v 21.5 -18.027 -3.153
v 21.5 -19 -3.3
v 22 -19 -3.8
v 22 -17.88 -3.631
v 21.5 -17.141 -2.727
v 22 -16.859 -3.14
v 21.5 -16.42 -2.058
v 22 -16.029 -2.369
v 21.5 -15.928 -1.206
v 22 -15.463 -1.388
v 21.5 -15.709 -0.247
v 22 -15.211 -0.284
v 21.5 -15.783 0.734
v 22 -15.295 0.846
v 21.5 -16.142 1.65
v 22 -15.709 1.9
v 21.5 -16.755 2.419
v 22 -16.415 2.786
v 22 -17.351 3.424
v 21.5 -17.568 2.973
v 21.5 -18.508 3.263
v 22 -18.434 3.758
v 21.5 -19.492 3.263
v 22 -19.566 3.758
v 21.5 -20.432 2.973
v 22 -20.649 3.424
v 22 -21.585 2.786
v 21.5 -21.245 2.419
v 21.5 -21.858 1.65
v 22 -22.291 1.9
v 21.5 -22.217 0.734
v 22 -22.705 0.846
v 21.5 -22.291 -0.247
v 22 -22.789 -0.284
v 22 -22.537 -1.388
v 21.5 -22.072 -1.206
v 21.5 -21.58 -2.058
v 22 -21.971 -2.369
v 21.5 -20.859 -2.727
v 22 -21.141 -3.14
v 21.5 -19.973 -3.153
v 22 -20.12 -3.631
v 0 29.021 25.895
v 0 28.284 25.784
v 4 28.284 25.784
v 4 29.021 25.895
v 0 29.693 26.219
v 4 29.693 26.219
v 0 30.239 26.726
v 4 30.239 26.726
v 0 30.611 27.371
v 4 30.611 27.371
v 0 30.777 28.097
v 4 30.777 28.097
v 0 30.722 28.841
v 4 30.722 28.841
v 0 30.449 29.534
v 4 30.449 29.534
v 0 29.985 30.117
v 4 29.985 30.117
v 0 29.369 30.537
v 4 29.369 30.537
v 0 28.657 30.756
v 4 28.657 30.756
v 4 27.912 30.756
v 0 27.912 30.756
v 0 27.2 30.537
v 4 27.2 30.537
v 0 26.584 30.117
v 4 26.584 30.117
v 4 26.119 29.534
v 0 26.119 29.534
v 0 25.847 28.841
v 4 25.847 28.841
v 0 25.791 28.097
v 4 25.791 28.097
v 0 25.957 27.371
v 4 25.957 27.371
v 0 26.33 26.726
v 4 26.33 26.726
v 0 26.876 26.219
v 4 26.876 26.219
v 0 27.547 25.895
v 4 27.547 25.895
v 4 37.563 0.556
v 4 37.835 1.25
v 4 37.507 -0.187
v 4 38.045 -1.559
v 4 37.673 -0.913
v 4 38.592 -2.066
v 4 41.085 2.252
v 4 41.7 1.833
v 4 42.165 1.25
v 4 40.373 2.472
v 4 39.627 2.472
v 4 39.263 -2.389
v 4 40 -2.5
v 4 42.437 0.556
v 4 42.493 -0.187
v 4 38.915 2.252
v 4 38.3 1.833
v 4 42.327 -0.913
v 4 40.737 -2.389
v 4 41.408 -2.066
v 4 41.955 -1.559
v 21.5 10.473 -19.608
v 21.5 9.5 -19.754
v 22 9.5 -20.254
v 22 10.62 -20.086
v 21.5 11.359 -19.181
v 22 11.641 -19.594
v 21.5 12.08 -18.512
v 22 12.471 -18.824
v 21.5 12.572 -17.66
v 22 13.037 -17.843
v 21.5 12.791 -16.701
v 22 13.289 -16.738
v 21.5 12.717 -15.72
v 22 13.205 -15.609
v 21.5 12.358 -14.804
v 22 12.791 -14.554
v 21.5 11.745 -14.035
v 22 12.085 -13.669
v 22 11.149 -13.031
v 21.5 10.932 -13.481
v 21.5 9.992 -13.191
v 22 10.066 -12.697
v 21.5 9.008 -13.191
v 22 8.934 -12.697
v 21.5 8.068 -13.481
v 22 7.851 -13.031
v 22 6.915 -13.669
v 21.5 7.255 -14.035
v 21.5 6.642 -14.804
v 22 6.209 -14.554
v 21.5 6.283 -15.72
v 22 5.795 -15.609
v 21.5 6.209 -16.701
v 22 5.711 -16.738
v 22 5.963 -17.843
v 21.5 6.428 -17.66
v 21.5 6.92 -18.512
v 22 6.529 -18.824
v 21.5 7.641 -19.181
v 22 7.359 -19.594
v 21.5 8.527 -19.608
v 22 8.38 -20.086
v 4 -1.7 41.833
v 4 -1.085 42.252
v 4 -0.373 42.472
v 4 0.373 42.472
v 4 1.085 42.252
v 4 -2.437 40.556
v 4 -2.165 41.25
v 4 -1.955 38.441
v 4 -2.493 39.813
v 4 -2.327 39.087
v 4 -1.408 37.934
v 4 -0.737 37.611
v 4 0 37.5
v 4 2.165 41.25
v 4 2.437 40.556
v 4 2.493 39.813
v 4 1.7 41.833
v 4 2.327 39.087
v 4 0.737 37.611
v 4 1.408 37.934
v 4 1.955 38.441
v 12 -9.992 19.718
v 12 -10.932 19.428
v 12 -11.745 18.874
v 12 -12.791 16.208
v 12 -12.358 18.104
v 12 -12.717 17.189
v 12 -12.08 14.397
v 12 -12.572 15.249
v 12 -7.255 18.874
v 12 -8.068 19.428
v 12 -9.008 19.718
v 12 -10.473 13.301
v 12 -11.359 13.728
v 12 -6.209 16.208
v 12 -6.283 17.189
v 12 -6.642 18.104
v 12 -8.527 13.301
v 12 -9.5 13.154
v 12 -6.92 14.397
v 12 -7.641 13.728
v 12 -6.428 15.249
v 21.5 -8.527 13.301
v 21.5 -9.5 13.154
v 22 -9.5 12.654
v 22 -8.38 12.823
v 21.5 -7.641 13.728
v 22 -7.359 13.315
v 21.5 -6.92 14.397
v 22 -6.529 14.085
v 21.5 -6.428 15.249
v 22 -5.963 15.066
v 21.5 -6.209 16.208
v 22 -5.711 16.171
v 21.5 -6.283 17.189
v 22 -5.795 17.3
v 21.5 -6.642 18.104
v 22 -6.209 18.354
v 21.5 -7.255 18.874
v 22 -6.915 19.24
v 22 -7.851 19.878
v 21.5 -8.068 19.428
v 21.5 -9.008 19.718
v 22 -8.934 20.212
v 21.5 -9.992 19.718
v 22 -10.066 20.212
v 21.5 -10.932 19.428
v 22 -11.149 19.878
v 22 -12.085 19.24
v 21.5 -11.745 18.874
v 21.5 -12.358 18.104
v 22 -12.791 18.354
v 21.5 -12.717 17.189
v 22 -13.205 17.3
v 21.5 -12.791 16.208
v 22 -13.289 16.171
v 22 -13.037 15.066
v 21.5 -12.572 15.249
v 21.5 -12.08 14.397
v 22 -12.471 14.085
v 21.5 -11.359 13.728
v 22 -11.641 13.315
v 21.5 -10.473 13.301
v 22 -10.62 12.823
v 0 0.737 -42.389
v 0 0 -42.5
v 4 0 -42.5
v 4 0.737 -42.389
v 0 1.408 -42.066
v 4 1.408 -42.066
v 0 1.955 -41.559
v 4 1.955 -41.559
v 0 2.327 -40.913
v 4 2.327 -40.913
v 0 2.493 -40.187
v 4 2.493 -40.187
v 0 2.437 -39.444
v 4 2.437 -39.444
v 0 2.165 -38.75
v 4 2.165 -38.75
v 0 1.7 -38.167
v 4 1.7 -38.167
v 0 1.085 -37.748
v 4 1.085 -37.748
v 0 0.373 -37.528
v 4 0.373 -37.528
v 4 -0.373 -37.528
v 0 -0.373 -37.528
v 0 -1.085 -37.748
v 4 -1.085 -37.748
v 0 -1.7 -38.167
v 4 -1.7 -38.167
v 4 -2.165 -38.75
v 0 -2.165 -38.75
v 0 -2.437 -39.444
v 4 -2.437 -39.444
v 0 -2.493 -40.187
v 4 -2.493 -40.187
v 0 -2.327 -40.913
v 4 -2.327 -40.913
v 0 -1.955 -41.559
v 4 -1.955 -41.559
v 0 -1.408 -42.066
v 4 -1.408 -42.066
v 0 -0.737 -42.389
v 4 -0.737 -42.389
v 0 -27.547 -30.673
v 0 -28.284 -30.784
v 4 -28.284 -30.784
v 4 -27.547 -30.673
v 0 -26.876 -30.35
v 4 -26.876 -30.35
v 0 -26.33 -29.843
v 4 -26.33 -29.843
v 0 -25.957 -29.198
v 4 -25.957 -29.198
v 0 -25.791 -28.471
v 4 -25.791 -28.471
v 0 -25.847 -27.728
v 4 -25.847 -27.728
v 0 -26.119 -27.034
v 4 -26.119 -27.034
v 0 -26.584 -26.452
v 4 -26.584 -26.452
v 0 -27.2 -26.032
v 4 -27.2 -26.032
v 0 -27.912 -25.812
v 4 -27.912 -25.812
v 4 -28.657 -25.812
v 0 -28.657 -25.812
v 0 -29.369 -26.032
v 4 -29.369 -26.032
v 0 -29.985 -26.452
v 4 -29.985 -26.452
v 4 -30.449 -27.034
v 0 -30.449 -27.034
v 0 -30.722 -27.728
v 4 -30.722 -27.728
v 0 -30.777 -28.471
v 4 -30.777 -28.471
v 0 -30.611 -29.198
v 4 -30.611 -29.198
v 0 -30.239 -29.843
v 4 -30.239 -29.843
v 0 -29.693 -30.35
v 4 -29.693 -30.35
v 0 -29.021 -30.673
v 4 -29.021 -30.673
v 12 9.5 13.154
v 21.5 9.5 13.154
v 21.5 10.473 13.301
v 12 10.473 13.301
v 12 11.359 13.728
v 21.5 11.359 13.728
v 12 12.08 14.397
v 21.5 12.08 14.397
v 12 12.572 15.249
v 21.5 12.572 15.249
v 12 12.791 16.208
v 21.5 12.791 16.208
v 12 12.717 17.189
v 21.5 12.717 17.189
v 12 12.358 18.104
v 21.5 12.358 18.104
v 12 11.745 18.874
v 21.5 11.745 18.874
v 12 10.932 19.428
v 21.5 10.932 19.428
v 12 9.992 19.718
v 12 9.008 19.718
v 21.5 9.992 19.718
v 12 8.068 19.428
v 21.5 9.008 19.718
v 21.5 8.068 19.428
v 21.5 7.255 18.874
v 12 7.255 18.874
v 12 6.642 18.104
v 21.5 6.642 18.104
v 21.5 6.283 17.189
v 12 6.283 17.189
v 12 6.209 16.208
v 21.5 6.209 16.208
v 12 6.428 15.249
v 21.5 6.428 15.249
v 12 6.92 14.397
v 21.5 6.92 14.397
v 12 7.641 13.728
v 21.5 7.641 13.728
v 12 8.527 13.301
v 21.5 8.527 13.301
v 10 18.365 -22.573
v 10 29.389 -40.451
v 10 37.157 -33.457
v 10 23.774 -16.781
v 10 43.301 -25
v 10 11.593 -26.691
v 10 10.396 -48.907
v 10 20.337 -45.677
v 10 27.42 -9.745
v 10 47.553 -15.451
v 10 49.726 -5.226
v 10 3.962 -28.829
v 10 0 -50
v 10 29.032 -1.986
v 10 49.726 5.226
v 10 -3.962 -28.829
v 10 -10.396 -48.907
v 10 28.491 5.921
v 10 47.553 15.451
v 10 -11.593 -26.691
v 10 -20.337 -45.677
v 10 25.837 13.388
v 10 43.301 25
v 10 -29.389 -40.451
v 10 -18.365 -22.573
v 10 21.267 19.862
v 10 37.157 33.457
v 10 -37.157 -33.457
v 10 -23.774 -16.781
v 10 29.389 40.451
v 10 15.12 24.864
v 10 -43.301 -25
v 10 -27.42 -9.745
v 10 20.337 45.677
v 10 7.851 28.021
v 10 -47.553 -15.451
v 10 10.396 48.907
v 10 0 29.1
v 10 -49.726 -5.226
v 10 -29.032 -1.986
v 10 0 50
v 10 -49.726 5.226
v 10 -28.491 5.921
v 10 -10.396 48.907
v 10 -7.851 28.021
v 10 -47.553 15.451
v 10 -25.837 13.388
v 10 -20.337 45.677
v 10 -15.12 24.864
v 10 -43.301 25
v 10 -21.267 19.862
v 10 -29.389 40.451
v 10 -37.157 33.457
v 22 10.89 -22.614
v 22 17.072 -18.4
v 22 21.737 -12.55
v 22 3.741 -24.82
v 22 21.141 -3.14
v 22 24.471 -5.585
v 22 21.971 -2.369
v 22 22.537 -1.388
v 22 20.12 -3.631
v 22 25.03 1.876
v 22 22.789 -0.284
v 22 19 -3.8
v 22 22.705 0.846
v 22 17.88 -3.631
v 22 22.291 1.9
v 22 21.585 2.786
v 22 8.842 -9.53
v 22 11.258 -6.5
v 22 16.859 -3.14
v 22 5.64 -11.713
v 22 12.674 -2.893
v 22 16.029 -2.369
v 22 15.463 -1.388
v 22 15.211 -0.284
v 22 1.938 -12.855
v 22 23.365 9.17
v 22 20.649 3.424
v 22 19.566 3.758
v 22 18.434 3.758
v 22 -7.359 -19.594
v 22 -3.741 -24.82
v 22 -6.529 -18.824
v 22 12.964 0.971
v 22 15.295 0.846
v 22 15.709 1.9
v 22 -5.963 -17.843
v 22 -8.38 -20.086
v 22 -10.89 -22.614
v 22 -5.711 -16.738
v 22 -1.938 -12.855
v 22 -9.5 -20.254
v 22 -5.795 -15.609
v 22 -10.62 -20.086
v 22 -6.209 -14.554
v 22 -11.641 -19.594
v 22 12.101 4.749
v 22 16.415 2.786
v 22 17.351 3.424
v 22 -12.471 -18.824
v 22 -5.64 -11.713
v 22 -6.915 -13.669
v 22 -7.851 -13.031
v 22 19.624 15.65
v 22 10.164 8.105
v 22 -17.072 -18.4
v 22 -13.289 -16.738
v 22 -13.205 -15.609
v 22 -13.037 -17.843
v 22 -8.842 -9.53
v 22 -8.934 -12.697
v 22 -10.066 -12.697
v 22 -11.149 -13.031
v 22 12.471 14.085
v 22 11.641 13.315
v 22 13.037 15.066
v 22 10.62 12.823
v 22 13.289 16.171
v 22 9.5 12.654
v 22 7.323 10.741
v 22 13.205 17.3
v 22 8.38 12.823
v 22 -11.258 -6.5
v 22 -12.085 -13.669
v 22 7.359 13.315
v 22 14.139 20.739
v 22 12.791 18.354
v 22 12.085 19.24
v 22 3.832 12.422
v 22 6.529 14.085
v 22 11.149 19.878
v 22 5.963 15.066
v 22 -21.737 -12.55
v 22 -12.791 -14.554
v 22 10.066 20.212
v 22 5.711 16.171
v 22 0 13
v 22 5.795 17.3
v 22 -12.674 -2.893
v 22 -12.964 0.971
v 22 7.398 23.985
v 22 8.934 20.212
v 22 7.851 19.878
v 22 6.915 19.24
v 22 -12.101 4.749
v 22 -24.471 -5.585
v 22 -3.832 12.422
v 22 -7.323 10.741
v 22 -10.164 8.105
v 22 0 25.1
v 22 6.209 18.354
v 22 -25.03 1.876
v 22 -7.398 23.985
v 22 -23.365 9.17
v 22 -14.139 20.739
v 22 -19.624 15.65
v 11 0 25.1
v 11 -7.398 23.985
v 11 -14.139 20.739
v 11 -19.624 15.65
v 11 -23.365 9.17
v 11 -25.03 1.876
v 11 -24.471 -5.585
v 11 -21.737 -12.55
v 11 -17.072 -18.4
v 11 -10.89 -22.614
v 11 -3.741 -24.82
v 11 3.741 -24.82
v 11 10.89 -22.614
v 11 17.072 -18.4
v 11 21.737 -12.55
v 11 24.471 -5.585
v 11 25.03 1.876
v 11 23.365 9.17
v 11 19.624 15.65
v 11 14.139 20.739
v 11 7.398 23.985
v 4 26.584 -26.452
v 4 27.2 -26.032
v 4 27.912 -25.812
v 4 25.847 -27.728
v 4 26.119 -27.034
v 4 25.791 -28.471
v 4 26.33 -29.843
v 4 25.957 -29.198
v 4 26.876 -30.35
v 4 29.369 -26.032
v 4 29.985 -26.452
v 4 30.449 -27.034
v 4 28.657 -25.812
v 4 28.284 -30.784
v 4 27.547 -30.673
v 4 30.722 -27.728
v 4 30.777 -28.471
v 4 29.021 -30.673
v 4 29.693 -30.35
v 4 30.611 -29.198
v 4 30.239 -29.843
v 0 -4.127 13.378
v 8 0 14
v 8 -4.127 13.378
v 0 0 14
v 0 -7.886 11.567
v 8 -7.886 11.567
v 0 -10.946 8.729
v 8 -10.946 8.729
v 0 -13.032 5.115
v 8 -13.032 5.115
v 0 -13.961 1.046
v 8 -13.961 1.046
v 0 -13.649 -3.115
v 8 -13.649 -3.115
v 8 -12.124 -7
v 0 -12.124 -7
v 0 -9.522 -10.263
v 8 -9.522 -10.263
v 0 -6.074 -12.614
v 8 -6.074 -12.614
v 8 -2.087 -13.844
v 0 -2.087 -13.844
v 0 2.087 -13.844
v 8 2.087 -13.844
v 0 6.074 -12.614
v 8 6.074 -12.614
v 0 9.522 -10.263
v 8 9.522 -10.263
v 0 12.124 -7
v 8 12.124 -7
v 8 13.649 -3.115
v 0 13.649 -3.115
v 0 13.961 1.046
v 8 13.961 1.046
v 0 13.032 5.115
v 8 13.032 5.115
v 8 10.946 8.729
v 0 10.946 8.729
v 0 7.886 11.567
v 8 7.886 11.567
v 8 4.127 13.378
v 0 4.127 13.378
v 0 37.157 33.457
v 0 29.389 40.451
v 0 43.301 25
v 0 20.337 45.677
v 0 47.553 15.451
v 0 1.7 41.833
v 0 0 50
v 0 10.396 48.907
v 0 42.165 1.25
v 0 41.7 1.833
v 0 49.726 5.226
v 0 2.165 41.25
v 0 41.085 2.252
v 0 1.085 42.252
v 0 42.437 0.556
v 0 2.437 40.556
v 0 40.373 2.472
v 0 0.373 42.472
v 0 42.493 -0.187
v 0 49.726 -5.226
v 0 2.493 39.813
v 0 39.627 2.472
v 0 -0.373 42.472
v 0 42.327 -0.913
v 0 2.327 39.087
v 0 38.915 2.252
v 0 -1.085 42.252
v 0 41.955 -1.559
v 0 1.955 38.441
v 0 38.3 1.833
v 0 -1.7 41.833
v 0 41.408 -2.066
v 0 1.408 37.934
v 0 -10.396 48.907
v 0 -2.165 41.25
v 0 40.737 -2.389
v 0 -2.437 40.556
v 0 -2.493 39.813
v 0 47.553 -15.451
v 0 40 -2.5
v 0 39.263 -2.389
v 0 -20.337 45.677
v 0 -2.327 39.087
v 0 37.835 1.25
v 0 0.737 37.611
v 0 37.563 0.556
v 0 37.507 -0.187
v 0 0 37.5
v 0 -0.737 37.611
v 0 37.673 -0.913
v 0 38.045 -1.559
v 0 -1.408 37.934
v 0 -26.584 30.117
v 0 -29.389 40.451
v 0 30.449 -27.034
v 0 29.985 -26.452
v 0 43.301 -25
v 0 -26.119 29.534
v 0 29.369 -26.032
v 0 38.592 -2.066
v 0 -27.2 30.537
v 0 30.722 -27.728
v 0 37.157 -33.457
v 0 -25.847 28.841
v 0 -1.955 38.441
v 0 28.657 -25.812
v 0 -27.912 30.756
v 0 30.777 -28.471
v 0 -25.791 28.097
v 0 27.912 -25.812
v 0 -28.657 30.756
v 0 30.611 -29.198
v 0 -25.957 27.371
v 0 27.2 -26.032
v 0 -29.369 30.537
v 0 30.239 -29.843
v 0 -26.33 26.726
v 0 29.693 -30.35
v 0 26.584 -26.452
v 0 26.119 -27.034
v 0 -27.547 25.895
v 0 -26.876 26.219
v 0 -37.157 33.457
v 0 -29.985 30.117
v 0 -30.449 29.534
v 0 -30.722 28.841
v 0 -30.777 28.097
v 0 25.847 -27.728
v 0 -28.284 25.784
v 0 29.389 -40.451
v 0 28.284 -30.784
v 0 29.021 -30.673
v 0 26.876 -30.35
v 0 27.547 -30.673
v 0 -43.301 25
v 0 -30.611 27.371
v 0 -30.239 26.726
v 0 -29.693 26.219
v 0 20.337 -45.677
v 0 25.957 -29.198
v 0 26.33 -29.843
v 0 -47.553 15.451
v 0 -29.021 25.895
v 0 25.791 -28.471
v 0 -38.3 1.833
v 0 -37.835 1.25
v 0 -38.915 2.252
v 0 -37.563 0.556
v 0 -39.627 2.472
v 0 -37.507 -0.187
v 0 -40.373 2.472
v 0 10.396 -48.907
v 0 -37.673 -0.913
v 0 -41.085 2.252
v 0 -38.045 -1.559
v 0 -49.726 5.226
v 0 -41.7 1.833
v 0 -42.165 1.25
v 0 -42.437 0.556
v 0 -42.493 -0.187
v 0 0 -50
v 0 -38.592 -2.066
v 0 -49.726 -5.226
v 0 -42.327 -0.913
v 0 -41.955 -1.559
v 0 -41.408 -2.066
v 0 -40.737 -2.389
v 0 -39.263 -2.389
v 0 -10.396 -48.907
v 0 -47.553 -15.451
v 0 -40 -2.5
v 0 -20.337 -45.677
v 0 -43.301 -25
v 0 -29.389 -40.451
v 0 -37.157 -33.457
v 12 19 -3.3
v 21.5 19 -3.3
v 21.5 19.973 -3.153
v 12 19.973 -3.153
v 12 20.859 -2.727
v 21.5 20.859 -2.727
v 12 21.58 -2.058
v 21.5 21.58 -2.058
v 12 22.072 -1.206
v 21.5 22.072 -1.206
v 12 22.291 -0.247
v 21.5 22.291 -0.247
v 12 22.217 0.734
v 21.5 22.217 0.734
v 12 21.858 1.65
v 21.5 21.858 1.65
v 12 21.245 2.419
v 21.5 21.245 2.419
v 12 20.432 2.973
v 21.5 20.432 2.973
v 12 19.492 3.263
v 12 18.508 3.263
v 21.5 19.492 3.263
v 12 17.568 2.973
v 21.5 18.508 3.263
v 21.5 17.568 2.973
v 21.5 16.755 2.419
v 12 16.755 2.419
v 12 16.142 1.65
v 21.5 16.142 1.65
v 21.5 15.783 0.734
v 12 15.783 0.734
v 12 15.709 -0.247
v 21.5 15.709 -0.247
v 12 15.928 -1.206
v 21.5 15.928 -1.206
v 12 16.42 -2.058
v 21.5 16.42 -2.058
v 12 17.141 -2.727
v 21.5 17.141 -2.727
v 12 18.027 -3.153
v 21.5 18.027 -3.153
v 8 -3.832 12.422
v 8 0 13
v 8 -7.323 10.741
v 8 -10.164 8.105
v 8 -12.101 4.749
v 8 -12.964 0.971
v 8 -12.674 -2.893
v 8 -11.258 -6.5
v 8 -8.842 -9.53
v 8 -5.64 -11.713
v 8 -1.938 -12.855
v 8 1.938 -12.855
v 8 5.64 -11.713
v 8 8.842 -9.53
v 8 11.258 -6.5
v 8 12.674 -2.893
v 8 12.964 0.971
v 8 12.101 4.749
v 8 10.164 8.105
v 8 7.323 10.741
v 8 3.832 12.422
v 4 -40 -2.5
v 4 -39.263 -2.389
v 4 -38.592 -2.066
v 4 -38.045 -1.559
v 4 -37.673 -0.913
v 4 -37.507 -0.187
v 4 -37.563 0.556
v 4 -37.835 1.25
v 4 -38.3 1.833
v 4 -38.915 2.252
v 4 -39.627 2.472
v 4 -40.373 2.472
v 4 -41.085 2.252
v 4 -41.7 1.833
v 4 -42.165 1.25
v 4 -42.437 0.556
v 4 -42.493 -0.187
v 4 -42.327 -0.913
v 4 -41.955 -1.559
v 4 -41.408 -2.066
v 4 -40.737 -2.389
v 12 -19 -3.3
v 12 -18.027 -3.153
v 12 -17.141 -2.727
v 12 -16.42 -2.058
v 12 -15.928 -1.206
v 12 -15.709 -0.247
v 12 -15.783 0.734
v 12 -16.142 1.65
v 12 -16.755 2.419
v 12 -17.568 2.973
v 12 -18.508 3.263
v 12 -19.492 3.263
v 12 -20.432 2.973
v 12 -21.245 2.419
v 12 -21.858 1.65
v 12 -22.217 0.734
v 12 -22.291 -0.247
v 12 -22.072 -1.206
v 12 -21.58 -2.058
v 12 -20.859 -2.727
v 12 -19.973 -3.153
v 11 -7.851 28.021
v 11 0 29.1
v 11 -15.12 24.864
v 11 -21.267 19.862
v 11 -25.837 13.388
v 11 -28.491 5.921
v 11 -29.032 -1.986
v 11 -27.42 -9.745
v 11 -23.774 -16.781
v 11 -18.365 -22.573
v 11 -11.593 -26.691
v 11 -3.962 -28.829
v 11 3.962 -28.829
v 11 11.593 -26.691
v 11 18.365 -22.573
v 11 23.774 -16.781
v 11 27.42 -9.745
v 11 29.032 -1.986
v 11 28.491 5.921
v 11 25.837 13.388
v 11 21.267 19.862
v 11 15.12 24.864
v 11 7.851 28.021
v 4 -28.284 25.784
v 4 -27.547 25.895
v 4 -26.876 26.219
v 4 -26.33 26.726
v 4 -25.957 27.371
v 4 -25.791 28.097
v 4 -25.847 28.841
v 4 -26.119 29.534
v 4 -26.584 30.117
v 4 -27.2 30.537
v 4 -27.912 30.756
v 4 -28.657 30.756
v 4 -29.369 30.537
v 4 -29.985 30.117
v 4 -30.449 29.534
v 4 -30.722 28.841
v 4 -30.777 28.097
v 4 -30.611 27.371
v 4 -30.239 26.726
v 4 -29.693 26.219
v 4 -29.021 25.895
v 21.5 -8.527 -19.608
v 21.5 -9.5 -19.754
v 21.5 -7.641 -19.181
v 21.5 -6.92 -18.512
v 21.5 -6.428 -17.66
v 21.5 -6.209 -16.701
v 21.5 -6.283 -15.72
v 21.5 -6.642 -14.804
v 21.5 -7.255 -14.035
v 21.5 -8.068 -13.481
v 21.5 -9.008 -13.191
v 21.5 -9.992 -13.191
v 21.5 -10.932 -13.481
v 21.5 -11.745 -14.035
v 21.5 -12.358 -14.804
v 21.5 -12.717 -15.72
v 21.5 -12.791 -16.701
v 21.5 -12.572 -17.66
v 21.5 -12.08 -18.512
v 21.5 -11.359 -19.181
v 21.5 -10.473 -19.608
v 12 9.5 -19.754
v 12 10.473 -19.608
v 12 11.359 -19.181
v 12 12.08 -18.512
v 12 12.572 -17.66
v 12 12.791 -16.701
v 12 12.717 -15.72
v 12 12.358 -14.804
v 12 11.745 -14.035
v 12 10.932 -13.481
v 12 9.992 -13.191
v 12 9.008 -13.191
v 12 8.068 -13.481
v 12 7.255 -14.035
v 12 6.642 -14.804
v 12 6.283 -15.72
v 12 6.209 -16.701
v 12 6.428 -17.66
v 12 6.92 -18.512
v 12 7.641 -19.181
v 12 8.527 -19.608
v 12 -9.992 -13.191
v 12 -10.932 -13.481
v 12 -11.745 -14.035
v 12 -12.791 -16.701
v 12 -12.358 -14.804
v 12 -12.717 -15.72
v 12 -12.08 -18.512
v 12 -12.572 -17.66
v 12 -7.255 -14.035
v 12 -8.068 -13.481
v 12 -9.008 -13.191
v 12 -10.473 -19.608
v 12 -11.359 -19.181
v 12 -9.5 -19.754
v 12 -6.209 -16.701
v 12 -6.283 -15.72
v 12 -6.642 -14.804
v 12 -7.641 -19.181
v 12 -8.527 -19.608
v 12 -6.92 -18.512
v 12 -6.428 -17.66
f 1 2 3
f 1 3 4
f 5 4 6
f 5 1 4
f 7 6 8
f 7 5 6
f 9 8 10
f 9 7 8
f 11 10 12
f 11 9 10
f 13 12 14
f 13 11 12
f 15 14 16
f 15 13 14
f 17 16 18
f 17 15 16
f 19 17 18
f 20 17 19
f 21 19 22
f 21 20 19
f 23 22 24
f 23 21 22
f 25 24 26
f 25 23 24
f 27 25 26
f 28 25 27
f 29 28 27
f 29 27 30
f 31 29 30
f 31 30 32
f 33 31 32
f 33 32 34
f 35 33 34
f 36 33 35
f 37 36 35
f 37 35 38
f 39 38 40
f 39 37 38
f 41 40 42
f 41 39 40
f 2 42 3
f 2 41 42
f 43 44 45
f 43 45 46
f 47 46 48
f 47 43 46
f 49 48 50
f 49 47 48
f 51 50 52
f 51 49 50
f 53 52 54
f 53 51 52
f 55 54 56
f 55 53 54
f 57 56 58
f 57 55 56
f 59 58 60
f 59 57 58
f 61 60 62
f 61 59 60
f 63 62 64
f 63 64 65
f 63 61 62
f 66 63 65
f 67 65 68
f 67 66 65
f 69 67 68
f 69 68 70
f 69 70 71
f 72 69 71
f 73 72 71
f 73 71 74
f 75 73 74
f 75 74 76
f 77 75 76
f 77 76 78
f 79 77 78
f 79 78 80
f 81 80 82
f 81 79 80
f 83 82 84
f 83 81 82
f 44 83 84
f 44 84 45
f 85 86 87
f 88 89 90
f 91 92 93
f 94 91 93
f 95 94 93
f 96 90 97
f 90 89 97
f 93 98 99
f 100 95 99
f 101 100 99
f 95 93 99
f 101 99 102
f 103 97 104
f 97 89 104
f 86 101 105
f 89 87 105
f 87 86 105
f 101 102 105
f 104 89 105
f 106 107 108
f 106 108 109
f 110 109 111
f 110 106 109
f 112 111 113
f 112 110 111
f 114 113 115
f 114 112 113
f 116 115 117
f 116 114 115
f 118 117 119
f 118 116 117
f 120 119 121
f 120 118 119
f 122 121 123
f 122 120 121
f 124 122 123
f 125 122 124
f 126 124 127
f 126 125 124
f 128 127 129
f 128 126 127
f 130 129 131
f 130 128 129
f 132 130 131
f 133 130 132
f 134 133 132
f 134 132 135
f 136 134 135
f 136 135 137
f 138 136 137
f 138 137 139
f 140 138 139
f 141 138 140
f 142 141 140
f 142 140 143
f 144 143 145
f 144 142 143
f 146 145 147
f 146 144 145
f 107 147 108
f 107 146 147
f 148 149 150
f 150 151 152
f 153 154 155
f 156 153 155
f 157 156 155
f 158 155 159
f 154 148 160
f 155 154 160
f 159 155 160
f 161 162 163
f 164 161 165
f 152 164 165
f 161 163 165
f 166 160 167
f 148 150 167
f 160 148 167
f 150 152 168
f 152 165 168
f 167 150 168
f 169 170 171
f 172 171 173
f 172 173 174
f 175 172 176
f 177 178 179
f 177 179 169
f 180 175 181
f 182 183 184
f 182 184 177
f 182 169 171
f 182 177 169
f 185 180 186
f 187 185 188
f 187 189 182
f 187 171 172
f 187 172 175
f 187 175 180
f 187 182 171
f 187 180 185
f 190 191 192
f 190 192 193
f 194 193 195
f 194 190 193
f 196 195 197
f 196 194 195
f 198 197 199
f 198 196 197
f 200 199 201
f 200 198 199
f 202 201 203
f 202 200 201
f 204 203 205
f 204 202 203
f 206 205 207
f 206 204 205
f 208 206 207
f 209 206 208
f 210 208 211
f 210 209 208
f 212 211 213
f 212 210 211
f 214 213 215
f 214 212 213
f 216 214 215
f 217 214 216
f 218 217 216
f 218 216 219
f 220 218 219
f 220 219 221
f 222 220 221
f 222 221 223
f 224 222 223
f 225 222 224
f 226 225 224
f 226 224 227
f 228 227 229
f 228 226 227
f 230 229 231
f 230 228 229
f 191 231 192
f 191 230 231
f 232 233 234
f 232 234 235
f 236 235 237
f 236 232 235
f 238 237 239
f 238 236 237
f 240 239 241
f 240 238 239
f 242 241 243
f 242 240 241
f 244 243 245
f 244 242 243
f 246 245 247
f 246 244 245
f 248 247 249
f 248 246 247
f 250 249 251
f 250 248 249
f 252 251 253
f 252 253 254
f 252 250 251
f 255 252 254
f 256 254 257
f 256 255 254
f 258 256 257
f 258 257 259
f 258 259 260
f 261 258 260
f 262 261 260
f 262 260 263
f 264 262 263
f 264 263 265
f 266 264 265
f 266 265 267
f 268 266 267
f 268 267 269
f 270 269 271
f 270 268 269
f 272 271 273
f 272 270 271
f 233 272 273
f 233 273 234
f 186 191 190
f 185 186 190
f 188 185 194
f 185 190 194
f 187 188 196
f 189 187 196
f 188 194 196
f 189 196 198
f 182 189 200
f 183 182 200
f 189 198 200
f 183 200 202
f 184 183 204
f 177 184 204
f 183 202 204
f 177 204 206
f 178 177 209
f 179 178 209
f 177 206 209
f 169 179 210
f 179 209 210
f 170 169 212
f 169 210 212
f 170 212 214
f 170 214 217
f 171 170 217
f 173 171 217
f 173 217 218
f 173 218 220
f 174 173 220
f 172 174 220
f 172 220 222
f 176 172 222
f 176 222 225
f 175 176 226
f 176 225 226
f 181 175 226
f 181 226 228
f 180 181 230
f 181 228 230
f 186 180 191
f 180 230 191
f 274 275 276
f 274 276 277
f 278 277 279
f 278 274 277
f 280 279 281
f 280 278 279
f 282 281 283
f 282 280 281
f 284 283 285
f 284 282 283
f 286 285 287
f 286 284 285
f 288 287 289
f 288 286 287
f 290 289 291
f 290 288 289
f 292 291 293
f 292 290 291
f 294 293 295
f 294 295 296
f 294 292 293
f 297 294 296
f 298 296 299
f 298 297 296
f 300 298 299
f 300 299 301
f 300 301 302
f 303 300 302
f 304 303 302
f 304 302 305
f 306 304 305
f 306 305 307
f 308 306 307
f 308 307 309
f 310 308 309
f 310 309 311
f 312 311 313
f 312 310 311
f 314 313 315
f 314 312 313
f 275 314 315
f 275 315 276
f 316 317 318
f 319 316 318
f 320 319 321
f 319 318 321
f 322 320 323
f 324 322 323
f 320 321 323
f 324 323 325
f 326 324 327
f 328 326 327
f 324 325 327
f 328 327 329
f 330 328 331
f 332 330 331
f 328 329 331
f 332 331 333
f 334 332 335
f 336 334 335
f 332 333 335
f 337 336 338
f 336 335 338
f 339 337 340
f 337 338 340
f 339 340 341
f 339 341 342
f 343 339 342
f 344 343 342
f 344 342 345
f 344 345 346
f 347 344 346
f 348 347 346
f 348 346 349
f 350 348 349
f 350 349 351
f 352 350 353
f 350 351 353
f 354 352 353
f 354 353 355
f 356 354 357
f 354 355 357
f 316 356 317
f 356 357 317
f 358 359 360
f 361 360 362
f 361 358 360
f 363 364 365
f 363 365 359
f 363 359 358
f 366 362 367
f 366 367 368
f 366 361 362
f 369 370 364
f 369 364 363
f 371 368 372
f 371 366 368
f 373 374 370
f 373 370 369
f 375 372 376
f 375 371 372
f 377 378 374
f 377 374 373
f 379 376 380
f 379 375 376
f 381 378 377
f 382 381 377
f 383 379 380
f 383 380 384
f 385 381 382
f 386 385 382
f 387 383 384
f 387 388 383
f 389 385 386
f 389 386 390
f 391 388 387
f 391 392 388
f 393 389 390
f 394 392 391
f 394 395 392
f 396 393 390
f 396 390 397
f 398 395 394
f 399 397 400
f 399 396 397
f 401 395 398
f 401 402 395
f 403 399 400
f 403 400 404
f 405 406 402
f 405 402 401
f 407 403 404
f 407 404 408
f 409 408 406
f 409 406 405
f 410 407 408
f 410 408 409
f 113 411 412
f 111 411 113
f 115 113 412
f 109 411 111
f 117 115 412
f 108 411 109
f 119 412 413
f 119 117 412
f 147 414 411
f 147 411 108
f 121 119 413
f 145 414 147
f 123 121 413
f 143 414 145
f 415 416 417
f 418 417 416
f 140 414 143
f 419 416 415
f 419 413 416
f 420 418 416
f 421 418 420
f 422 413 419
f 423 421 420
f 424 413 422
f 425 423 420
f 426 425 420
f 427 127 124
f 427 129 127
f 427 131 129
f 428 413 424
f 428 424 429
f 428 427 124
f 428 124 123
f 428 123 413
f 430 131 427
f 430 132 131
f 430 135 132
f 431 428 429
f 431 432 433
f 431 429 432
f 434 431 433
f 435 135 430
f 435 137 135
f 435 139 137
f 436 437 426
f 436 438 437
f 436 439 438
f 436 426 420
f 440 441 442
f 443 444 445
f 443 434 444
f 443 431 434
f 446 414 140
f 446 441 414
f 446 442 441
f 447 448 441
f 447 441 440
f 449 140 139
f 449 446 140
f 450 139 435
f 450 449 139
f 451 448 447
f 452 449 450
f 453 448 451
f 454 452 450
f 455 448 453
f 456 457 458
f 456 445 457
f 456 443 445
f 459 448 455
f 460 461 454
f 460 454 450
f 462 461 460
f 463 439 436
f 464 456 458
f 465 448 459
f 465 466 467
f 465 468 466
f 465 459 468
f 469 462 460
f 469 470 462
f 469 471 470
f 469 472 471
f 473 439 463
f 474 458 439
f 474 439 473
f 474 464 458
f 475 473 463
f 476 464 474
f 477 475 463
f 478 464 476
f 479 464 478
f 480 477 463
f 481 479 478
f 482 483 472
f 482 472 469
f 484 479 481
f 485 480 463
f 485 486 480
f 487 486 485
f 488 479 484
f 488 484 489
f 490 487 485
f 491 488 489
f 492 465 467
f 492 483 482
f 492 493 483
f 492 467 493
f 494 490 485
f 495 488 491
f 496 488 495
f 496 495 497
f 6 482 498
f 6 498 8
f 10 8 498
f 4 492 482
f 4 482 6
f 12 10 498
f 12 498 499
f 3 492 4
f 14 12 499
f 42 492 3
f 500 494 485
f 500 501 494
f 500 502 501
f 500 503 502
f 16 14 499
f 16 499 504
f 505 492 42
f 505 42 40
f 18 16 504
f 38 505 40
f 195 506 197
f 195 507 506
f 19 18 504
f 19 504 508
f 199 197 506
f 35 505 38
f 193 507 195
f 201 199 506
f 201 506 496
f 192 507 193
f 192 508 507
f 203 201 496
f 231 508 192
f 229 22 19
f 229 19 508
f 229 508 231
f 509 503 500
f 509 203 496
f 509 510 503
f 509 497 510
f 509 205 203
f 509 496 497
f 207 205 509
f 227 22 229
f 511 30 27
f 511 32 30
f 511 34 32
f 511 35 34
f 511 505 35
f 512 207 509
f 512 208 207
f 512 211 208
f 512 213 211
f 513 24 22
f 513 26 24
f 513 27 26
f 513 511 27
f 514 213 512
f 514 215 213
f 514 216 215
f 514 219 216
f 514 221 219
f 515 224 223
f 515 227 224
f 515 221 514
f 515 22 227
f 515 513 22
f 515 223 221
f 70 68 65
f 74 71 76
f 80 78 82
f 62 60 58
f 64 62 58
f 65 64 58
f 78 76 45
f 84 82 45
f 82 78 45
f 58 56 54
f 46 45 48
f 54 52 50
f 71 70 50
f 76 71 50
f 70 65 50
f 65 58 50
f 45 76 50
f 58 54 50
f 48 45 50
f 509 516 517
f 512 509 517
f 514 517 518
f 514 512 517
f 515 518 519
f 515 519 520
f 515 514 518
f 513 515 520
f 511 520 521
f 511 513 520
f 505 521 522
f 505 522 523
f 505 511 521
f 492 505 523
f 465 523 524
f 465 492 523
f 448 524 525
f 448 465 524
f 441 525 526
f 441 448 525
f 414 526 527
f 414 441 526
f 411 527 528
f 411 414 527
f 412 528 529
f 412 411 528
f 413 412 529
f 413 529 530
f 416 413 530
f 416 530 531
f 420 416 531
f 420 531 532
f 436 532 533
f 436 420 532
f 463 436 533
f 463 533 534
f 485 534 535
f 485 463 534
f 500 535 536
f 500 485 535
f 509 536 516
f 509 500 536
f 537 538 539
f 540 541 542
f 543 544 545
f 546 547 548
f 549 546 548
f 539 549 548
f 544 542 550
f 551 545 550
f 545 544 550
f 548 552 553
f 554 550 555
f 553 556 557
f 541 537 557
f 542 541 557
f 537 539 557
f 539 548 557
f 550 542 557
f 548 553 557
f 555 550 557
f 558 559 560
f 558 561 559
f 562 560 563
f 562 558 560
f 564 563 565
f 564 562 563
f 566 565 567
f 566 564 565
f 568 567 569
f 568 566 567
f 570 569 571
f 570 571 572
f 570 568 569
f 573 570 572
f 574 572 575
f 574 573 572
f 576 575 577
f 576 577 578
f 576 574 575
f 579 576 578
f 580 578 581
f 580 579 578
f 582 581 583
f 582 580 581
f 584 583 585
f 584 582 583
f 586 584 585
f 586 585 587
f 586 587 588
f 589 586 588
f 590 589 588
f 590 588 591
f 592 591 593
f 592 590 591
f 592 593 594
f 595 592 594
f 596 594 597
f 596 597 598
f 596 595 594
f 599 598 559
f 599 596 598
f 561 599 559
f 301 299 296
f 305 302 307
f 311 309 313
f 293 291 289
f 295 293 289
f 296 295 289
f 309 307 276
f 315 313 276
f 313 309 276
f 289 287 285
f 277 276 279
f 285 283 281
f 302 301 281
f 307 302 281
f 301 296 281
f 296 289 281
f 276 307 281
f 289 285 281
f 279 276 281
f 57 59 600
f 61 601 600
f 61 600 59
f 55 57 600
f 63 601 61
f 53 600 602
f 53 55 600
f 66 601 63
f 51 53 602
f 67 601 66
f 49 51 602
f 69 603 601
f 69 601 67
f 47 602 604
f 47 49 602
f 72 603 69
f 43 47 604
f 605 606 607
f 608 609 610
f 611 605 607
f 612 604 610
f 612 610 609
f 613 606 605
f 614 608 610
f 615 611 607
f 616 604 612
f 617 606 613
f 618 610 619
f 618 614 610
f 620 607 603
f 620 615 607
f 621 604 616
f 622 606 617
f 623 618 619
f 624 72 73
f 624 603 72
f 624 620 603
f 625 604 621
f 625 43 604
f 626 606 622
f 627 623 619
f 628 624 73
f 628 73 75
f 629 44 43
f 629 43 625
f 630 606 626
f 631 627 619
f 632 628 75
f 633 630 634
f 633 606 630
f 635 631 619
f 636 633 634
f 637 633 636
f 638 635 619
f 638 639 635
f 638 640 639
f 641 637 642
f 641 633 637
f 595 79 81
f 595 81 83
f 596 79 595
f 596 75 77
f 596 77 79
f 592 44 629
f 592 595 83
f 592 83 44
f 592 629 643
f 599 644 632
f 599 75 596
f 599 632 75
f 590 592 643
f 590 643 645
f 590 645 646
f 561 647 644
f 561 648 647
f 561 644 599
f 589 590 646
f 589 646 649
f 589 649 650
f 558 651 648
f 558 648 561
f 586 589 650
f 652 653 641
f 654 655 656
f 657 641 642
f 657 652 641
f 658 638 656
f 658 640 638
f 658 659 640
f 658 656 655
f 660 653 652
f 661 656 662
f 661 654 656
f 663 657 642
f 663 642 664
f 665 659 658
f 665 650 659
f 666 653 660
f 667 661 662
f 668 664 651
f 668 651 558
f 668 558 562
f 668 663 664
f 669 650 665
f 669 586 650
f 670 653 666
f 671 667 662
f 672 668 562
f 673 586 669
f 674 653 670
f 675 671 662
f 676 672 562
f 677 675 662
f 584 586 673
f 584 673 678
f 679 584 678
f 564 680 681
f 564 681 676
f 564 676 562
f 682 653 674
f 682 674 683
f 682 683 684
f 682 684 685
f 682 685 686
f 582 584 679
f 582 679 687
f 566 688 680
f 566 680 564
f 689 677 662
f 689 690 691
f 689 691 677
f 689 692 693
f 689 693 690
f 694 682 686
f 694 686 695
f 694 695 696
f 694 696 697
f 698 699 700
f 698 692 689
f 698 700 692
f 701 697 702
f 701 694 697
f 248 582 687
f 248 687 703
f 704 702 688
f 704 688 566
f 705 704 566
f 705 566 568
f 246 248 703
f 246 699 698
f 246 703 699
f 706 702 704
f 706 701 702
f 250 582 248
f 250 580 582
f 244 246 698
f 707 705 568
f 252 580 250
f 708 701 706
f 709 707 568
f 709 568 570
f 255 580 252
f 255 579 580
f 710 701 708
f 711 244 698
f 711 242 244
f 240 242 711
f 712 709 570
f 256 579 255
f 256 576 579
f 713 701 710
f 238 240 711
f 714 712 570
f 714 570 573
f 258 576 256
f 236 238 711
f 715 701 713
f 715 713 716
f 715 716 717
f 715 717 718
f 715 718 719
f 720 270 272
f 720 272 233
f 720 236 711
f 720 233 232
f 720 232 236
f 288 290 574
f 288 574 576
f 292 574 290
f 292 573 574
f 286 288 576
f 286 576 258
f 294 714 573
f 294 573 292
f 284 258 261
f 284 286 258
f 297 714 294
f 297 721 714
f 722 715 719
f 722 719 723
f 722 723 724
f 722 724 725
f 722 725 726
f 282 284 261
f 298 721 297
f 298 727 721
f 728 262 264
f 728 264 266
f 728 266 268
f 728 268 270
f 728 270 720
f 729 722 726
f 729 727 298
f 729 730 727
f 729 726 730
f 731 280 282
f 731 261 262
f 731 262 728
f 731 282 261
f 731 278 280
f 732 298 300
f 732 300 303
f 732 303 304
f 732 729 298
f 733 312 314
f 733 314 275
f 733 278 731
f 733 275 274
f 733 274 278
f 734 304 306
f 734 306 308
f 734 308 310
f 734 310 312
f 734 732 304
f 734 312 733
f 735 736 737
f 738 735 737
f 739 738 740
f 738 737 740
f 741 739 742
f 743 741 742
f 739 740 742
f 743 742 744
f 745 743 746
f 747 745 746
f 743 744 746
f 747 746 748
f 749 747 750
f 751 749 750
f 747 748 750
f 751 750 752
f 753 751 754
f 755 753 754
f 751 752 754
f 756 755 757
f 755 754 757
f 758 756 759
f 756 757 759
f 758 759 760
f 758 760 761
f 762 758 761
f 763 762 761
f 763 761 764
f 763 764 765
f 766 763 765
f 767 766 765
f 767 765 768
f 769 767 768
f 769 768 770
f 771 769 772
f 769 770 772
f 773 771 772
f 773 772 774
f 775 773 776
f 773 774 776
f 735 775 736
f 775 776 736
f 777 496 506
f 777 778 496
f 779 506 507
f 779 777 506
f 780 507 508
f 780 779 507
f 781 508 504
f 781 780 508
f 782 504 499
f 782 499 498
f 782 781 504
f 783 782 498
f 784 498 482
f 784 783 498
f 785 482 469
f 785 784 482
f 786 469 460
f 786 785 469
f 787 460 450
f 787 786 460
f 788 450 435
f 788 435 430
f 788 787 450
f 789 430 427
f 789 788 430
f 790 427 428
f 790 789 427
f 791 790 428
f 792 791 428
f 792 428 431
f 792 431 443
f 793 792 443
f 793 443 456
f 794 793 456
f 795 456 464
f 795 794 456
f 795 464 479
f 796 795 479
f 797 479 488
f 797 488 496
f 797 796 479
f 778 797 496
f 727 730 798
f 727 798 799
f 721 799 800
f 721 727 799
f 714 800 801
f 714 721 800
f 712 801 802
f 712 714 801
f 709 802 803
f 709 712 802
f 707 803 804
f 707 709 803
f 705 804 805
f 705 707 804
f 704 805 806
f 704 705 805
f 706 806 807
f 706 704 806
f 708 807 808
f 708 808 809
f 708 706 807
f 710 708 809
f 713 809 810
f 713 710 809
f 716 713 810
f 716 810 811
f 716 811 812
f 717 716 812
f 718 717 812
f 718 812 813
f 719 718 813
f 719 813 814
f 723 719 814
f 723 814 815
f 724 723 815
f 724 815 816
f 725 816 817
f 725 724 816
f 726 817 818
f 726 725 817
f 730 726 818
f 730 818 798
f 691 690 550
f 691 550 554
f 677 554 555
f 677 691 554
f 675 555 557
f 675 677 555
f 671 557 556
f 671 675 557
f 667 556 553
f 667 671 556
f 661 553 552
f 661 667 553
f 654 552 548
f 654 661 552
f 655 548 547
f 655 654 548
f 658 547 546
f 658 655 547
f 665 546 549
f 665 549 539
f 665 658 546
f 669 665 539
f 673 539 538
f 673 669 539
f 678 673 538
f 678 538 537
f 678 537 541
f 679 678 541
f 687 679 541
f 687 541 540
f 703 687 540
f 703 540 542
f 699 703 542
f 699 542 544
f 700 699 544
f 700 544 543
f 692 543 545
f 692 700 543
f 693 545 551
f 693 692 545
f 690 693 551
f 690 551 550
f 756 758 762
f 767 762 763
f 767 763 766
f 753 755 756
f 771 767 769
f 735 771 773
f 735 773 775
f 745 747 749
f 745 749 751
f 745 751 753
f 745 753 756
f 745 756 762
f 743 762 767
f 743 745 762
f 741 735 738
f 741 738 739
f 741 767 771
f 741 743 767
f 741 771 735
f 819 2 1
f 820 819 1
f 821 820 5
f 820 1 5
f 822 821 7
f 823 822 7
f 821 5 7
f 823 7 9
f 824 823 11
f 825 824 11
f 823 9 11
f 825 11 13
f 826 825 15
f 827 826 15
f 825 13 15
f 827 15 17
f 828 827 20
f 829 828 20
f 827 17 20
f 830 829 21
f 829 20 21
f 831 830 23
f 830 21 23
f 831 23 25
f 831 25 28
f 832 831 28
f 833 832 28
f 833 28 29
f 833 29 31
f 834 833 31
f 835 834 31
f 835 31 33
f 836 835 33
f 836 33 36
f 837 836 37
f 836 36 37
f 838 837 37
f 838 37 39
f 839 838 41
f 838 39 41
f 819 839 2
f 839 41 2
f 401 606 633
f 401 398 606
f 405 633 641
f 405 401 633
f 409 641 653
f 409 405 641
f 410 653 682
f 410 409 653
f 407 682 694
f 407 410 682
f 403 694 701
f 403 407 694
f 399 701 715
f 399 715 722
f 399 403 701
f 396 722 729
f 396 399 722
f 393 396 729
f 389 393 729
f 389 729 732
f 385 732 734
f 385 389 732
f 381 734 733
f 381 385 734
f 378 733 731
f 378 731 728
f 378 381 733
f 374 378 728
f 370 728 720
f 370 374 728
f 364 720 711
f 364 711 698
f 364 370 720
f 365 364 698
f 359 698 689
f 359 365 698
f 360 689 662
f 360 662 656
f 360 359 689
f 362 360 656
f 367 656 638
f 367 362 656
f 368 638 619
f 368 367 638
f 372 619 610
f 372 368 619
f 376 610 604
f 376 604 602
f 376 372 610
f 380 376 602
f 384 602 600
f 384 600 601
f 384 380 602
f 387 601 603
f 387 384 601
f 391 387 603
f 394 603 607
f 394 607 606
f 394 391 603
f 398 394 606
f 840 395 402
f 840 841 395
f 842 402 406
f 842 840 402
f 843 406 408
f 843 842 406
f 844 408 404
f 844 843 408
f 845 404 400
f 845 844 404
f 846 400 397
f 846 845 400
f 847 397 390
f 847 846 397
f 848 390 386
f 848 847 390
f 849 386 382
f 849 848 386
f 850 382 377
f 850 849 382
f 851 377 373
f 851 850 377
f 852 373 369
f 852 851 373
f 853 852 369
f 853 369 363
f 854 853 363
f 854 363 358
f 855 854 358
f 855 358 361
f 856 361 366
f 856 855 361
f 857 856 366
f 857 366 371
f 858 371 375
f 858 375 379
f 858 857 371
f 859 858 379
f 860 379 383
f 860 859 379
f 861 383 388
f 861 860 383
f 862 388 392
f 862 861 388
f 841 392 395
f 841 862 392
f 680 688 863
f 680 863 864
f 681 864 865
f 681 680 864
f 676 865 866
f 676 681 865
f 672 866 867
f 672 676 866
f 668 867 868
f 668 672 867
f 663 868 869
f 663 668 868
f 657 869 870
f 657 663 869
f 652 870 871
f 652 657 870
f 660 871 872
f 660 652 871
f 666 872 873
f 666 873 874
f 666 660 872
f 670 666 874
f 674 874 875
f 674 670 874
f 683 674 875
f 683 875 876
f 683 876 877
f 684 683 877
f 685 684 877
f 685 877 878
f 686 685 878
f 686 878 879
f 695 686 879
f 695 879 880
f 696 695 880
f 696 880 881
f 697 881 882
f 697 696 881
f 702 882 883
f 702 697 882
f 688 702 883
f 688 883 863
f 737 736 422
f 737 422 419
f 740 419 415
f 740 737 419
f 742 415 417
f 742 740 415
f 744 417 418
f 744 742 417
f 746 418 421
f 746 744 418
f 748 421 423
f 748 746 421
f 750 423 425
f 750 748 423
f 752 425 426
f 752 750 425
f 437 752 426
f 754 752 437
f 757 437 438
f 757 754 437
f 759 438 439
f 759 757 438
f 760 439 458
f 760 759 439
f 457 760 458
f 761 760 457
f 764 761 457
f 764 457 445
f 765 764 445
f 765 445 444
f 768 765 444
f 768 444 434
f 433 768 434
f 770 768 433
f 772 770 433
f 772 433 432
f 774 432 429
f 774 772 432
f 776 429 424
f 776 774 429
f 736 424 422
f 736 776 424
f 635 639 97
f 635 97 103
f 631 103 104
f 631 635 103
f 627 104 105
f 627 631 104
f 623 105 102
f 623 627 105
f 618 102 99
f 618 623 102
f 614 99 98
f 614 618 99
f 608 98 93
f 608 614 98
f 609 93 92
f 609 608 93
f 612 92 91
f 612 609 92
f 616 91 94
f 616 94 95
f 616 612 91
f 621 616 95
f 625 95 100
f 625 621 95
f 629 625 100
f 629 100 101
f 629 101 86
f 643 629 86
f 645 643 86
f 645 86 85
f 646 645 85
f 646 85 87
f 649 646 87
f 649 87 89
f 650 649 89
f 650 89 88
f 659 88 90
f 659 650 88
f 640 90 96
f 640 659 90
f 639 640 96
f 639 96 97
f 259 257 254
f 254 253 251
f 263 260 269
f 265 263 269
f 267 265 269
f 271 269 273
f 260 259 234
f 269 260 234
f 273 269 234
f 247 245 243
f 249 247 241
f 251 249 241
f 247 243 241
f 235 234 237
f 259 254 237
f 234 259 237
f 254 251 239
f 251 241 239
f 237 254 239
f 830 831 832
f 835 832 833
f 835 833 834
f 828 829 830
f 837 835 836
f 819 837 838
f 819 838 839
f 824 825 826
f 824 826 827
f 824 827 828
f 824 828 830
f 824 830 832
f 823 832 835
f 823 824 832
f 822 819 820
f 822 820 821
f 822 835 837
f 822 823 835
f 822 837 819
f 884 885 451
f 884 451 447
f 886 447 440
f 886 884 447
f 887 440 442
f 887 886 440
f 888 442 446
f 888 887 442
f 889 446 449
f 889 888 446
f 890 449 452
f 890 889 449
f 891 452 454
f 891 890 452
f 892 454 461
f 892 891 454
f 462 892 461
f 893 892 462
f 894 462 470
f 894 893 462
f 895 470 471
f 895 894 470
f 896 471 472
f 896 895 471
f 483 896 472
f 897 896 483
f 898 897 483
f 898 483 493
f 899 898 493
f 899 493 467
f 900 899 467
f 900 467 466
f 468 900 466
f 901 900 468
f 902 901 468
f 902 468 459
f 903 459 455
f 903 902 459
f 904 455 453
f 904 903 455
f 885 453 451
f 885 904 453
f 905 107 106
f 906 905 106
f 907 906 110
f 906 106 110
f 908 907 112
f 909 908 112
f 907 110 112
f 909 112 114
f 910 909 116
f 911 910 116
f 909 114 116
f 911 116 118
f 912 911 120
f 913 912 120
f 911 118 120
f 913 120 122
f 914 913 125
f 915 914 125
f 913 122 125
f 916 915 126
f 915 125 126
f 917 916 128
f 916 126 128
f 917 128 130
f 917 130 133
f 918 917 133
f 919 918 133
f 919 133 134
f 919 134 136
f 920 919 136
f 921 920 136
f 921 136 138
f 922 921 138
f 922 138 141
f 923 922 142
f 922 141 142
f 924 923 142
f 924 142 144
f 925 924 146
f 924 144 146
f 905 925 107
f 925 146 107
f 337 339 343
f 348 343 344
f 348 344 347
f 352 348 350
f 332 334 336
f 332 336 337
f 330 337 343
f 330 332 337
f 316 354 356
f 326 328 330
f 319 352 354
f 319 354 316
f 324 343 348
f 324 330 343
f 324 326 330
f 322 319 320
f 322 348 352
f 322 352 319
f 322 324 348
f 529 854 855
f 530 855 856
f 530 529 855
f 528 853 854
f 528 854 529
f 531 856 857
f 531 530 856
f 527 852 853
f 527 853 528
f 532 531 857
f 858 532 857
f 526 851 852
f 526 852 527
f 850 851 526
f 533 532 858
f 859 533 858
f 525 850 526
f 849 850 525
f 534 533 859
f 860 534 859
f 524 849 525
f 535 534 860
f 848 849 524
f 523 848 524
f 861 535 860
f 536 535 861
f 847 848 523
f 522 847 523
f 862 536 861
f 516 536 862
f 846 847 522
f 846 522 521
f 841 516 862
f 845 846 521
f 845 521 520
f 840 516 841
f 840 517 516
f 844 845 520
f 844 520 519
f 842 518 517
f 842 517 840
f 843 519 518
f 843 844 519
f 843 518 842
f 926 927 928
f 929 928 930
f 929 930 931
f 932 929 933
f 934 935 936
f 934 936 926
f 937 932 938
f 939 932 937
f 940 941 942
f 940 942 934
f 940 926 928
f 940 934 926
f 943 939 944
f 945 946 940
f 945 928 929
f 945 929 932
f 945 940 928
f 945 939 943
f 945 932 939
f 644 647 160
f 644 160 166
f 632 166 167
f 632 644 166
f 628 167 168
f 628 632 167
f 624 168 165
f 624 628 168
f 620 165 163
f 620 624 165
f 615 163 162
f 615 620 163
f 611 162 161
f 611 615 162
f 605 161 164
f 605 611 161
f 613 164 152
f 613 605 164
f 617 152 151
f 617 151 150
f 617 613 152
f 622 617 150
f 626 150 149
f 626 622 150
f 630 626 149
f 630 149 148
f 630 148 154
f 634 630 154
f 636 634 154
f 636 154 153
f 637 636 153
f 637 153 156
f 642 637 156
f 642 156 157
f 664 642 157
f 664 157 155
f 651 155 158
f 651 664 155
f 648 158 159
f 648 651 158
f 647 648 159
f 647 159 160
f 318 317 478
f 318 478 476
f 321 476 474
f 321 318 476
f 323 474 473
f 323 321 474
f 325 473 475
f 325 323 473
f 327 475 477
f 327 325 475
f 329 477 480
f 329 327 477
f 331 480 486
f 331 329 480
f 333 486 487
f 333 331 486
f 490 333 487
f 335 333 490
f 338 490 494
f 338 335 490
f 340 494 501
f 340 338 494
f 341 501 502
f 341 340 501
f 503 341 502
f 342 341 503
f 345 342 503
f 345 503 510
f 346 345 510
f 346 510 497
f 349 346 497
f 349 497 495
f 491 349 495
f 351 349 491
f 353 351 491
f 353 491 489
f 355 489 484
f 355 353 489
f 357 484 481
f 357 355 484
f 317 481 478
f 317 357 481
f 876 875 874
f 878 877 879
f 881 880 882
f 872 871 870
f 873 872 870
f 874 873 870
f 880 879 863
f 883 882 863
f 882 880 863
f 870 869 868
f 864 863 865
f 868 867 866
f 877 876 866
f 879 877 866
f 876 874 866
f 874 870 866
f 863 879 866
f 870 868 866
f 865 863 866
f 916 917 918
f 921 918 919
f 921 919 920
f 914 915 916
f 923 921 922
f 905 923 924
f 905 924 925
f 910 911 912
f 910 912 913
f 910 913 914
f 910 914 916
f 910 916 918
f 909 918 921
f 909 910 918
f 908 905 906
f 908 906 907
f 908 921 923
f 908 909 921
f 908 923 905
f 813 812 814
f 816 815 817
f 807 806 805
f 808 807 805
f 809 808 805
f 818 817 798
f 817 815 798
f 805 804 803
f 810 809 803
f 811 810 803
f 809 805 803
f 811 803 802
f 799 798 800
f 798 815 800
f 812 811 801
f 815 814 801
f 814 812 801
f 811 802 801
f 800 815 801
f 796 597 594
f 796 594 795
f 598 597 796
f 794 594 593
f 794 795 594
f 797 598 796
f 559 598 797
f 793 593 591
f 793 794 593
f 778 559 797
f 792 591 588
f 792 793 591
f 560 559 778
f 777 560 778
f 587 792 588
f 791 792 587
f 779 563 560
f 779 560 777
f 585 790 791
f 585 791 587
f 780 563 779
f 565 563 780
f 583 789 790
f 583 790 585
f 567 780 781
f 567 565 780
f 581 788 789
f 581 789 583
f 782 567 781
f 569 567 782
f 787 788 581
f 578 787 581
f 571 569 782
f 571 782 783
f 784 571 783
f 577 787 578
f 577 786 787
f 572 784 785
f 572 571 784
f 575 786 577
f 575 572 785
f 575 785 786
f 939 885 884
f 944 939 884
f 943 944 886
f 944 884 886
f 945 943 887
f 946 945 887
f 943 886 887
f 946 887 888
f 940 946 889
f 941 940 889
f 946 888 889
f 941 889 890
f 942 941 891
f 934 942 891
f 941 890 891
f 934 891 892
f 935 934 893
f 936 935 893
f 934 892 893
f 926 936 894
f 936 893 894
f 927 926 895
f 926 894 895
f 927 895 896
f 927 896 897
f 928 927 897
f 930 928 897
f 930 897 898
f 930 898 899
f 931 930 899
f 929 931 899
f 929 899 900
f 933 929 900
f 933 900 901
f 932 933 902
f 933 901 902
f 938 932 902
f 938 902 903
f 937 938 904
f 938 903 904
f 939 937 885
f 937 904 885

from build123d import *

# Parameters (mm, degrees)
SKETCH3_R          = 2.5
CUT_EXTRUDE1_DEPTH = 4
SKETCH4_R          = 3.3
CUT_EXTRUDE2_DEPTH = 10
CHAMFER1_SIZE      = 0.5


with BuildPart() as part:
    # Sketch2 → Revolve1 (revolve)
    with BuildSketch(Plane.XY, mode=Mode.PRIVATE) as revolve1_sk:
        Polygon((0, 50), (10, 50), (10, 29.1), (11, 29.1), (11, 25.1), (22, 25.1), (22, 13), (8, 13), (8, 14), (0, 14), align=None)
    revolve(revolve1_sk.sketch.rotate(Axis((0, 0, 0), (1, 0, 0)), 90), axis=Axis((0, 0, 0), (1, 0, 0)))

    # Sketch3 → Cut-Extrude1 (cut)
    with BuildSketch(Plane(origin=(0, 0, 0), x_dir=(0, 0, -1), z_dir=(1, 0, 0))):
        with Locations((0, 40)):
            Circle(SKETCH3_R)
        with Locations((28.284271247, 28.284271247)):
            Circle(SKETCH3_R)
        with Locations((40, 0)):
            Circle(SKETCH3_R)
        with Locations((28.284271247, -28.284271247)):
            Circle(SKETCH3_R)
        with Locations((0, -40)):
            Circle(SKETCH3_R)
        with Locations((-28.284271247, -28.284271247)):
            Circle(SKETCH3_R)
        with Locations((-40, 0)):
            Circle(SKETCH3_R)
        with Locations((-28.284271247, 28.284271247)):
            Circle(SKETCH3_R)
    extrude(amount=CUT_EXTRUDE1_DEPTH, mode=Mode.SUBTRACT)

    # Sketch4 → Cut-Extrude2 (cut)
    with BuildSketch(Plane(origin=(22, 0, 0), x_dir=(0, 0, -1), z_dir=(1, 0, 0))):
        with Locations((0, 19)):
            Circle(SKETCH4_R)
        with Locations((16.454482672, 9.5)):
            Circle(SKETCH4_R)
        with Locations((16.454482672, -9.5)):
            Circle(SKETCH4_R)
        with Locations((0, -19)):
            Circle(SKETCH4_R)
        with Locations((-16.454482672, -9.5)):
            Circle(SKETCH4_R)
        with Locations((-16.454482672, 9.5)):
            Circle(SKETCH4_R)
    extrude(amount=-CUT_EXTRUDE2_DEPTH, mode=Mode.SUBTRACT)

    # Chamfer1
    chamfer1_edges = [part.edges().sort_by_distance(p)[0] for p in [
        (22, 19, 3.3),
        (22, 9.5, 19.754482672),
        (22, -9.5, 19.754482672),
        (22, -19, 3.3),
        (22, -9.5, -13.154482672),
        (22, 9.5, -13.154482672),
    ]]
    chamfer(chamfer1_edges, length=CHAMFER1_SIZE)


solid = part.part
